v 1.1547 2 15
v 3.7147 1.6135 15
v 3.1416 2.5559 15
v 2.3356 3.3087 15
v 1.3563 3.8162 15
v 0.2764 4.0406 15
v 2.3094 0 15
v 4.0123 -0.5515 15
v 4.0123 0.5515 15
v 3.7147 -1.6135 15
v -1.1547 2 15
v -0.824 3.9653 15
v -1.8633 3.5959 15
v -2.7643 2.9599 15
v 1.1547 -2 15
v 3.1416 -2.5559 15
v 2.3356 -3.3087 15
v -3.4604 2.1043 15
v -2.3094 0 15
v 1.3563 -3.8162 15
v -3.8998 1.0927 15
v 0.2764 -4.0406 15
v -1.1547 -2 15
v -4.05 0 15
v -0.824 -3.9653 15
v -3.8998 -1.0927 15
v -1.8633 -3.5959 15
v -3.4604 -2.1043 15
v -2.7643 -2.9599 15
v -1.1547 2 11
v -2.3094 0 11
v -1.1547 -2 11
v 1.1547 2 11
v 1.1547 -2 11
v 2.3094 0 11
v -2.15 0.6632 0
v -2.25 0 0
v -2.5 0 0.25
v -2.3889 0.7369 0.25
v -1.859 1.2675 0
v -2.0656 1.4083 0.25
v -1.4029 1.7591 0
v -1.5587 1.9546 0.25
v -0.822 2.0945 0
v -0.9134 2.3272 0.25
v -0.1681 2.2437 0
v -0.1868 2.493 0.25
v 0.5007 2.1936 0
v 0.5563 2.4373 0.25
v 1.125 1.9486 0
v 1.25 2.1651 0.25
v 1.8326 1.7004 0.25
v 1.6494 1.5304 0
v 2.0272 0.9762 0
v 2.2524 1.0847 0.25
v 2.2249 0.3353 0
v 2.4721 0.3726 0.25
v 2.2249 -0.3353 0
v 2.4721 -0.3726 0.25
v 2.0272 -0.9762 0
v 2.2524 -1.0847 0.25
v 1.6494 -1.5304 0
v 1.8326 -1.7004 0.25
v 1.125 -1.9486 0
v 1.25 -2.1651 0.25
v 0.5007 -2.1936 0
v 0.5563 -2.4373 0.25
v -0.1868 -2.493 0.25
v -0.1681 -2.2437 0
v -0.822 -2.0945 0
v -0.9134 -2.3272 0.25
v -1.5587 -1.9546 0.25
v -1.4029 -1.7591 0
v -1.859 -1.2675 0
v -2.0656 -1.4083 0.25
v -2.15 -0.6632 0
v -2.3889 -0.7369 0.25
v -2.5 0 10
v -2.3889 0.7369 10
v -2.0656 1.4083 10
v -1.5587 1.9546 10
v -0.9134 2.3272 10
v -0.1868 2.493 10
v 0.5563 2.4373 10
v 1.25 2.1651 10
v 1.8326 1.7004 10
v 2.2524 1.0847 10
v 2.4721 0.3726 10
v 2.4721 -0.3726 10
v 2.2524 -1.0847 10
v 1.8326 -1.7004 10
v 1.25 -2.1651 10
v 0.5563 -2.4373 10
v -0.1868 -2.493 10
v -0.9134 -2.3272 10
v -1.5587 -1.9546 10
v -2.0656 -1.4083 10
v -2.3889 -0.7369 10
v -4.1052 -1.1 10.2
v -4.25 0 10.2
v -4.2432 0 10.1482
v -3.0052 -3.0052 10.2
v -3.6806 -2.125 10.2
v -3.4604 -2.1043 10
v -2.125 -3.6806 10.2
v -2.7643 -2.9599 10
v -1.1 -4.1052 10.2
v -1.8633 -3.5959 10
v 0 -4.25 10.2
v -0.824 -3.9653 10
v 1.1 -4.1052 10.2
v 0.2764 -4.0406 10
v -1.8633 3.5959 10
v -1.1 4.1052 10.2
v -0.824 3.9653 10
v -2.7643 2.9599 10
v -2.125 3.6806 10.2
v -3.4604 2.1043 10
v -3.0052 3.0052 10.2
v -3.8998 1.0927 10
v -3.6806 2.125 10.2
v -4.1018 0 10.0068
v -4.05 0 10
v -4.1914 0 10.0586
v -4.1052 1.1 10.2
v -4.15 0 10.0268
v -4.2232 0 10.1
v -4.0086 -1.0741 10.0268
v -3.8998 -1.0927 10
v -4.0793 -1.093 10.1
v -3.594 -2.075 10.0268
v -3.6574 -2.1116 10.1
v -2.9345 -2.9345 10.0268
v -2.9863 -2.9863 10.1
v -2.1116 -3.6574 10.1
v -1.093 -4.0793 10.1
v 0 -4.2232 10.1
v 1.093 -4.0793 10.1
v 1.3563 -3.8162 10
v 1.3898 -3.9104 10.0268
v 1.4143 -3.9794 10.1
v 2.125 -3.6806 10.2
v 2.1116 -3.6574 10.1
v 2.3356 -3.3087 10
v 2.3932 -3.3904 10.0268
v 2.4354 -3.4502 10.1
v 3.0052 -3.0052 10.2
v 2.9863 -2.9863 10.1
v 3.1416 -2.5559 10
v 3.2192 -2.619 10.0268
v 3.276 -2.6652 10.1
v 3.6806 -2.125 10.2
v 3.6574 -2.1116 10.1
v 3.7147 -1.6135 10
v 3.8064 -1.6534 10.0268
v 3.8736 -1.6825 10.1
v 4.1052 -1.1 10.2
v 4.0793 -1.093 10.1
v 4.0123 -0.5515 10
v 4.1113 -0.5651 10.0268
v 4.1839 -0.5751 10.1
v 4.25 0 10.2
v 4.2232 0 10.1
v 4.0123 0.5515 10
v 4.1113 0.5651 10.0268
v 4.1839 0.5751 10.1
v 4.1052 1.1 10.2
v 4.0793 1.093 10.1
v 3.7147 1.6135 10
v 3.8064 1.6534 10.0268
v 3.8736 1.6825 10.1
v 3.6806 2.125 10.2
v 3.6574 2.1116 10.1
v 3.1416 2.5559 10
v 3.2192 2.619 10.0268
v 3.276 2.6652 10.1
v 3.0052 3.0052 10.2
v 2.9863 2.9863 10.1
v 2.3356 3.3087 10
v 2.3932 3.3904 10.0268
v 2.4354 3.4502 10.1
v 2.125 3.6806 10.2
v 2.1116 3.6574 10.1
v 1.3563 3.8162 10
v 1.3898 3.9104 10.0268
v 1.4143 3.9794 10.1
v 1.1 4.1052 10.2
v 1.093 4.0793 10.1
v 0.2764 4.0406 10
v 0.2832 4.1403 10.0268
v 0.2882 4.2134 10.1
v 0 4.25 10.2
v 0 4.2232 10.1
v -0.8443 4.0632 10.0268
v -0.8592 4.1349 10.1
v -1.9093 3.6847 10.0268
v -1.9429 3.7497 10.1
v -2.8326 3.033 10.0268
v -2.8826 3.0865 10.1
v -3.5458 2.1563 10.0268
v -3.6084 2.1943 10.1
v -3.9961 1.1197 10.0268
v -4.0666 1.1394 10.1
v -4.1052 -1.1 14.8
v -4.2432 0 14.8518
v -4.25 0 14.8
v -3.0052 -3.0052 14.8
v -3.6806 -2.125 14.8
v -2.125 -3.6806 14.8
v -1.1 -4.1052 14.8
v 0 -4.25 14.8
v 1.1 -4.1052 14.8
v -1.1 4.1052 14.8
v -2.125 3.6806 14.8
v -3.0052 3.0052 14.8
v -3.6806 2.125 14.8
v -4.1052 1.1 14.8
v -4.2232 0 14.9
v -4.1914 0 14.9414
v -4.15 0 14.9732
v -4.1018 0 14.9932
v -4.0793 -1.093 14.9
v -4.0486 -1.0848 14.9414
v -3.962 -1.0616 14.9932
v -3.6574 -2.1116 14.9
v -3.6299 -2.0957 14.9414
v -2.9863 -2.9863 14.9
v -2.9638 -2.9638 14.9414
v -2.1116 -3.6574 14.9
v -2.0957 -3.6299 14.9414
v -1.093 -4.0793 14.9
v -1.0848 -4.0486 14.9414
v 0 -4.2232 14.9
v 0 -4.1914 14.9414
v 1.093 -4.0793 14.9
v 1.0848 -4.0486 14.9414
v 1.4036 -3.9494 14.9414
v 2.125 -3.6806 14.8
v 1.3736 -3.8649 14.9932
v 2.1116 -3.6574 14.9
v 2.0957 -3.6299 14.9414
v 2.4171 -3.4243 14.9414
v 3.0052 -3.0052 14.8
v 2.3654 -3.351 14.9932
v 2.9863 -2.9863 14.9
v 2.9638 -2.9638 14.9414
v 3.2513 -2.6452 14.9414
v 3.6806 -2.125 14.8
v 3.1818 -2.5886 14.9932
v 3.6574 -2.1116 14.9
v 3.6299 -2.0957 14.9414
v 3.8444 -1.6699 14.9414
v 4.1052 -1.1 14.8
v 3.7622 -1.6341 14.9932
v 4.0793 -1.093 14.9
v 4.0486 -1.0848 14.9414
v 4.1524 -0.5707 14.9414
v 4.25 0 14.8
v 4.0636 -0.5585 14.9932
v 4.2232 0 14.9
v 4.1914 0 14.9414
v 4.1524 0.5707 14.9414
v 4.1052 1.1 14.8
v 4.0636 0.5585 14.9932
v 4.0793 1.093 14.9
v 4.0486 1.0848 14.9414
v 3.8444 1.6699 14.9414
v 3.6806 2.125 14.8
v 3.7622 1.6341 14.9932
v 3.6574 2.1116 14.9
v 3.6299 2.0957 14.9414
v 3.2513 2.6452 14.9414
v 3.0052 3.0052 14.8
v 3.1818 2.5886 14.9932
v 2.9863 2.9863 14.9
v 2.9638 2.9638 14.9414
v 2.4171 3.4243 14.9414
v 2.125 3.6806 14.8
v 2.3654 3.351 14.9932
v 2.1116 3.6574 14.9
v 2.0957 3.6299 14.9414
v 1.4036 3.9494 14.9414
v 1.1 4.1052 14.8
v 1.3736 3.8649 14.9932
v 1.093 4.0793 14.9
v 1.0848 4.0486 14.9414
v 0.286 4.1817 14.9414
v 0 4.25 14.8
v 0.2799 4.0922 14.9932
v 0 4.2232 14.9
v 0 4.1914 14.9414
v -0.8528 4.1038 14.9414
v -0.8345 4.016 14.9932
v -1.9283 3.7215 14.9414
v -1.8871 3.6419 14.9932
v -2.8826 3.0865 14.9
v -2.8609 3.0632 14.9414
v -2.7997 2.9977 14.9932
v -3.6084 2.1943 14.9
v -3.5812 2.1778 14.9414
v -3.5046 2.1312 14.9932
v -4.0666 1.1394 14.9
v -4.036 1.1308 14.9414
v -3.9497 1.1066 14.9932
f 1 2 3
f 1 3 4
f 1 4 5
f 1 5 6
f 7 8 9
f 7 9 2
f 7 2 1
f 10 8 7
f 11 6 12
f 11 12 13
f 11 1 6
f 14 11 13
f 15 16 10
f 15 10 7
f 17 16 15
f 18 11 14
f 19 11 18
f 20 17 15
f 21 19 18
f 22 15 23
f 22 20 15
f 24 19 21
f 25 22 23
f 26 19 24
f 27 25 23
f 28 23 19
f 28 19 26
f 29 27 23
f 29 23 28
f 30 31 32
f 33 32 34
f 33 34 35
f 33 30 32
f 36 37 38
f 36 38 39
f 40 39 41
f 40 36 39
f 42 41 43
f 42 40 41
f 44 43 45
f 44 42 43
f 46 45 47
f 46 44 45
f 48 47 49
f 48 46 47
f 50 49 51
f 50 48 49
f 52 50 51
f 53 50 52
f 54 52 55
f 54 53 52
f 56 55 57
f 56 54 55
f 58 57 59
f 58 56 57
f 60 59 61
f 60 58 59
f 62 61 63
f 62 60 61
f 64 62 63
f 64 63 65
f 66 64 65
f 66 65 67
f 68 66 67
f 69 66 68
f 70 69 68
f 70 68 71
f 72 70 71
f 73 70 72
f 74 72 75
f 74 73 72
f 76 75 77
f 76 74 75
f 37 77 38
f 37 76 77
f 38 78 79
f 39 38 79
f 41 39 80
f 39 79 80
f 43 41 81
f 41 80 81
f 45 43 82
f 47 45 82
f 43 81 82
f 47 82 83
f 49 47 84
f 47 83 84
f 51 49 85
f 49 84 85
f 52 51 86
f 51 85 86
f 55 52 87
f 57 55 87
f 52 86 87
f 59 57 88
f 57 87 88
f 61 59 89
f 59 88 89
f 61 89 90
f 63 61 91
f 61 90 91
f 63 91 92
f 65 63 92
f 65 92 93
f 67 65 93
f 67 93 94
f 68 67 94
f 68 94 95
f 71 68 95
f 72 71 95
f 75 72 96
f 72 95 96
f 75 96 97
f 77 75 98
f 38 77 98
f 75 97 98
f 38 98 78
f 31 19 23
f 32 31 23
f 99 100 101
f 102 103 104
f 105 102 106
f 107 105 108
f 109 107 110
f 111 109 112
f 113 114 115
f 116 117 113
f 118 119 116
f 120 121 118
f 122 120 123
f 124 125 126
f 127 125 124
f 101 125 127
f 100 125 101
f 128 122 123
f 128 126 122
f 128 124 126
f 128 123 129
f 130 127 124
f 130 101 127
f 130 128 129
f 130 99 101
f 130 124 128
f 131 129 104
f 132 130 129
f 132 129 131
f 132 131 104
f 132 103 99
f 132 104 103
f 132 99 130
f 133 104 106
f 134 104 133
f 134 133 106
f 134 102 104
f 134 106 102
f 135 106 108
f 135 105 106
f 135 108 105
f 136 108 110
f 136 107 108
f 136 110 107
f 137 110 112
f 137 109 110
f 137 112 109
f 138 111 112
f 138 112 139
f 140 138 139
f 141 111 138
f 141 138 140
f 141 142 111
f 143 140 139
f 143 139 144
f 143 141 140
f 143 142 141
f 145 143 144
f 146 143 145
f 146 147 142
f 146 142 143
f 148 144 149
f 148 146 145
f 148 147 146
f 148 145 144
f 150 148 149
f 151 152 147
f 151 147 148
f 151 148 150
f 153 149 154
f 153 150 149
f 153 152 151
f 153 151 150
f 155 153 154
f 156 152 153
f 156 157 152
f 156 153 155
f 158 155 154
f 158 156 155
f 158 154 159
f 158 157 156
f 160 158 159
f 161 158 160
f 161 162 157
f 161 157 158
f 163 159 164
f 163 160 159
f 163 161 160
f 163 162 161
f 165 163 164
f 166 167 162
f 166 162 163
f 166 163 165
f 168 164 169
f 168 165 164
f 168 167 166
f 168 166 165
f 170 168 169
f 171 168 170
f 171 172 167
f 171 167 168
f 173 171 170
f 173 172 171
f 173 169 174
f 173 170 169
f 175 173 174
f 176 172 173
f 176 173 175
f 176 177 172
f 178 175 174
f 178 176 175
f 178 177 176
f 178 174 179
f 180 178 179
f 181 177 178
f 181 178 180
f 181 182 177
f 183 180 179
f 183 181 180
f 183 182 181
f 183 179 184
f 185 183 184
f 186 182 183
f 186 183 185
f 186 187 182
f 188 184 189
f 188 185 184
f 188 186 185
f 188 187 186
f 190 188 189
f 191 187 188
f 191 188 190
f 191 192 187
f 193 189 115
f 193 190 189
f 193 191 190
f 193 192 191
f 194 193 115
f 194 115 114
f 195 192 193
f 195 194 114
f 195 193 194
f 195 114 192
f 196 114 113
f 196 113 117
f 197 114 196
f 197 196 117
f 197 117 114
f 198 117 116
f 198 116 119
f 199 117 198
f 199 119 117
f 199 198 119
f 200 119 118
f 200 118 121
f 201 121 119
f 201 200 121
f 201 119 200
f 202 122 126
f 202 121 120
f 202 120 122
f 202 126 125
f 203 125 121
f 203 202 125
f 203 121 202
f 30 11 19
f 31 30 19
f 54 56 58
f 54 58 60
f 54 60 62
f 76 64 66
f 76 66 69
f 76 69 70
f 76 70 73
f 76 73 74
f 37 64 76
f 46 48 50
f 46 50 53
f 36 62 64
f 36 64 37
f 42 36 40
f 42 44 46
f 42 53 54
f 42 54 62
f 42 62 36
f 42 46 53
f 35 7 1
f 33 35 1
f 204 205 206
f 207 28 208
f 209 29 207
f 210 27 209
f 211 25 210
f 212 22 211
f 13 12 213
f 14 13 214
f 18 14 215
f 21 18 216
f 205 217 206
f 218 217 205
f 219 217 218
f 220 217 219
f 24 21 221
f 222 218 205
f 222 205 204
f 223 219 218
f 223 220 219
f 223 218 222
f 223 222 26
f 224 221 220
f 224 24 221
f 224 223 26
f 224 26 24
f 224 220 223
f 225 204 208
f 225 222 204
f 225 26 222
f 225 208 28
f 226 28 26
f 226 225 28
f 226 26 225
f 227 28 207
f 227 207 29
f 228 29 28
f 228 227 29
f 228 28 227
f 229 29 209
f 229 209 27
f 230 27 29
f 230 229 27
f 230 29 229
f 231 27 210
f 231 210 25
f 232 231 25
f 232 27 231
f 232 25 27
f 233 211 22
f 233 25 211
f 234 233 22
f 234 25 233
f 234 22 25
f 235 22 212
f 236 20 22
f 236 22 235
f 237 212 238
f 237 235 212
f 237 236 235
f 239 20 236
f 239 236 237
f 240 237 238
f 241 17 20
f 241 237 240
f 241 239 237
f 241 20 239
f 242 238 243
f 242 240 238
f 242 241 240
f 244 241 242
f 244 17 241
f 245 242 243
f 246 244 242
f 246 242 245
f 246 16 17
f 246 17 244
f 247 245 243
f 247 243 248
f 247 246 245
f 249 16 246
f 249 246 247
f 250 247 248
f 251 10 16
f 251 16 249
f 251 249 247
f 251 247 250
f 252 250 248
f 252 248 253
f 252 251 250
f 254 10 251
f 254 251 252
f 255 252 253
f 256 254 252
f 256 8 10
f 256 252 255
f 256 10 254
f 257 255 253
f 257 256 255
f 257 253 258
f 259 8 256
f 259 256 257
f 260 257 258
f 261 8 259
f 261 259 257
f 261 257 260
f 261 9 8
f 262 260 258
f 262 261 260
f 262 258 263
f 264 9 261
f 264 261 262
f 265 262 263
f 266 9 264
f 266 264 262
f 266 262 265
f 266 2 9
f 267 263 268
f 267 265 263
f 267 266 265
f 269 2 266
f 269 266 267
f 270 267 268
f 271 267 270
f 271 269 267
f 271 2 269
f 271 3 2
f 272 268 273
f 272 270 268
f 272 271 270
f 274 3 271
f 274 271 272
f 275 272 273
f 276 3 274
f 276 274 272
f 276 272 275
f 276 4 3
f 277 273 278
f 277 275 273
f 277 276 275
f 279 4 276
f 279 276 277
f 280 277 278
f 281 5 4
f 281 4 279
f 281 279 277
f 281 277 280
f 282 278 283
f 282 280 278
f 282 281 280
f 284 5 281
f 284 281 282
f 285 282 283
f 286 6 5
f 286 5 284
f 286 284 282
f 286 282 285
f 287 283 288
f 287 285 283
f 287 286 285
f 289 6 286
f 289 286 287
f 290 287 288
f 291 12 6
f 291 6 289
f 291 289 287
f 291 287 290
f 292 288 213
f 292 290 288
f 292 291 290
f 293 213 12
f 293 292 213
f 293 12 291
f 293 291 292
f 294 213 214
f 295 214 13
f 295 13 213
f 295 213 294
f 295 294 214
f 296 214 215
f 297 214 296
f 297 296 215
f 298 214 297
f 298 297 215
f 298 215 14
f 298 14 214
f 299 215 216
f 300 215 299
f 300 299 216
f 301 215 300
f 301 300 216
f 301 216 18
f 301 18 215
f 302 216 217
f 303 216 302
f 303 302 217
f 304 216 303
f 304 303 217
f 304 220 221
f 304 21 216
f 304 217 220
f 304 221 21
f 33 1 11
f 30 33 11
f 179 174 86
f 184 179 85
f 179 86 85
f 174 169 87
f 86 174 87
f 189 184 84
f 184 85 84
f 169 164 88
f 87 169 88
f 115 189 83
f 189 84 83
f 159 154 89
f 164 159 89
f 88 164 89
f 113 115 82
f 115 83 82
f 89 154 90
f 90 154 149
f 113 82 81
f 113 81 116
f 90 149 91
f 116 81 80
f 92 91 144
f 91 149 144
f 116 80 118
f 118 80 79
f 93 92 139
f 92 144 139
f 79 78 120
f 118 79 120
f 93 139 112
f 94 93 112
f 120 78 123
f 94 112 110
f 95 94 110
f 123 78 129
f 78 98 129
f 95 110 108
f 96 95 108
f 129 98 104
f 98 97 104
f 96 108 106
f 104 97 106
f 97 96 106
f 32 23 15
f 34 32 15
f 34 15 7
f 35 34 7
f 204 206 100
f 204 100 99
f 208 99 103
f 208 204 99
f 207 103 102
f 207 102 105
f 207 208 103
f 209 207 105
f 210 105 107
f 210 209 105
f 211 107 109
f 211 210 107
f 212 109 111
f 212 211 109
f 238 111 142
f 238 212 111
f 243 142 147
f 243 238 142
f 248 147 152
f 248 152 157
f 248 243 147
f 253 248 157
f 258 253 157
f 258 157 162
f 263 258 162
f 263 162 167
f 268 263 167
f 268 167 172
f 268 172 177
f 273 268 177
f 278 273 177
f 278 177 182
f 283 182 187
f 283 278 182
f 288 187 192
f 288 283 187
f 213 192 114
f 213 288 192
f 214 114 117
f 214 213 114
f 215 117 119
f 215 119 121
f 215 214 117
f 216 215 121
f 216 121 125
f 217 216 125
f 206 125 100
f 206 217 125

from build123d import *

# Parameters (mm, degrees)
SKETCH1_R           = 4.25
BOSS_EXTRUDE1_DEPTH = 5
SKETCH2_R           = 2.5
BOSS_EXTRUDE2_DEPTH = 10
CUT_EXTRUDE1_DEPTH  = 4
CHAMFER1_SIZE       = 0.25
FILLET1_R           = 0.2


with BuildPart() as part:
    # Sketch1 → Boss-Extrude1 (new body)
    with BuildSketch(Plane.XY.offset(15)):
        with Locations(Location((0, 0, 0), (0, 0, 180))):
            Circle(SKETCH1_R)
    extrude(amount=-BOSS_EXTRUDE1_DEPTH)

    # Sketch2 → Boss-Extrude2 (add)
    with BuildSketch(Plane(origin=(0, 0, 10), x_dir=(-1, 0, 0), z_dir=(0, 0, -1))):
        Circle(SKETCH2_R)
    extrude(amount=BOSS_EXTRUDE2_DEPTH)

    # Sketch3 → Cut-Extrude1 (cut)
    with BuildSketch(Plane.XY.offset(15)):
        Polygon((-2.309401077, 0), (-1.154700538, -2), (1.154700538, -2), (2.309401077, 0), (1.154700538, 2), (-1.154700538, 2), align=None)
    extrude(amount=-CUT_EXTRUDE1_DEPTH, mode=Mode.SUBTRACT)

    # Chamfer1
    chamfer1_edges = [part.edges().sort_by_distance(p)[0] for p in [
        (2.5, 0, 0),
    ]]
    chamfer(chamfer1_edges, length=CHAMFER1_SIZE)

    # Fillet1
    fillet1_edges = [part.edges().sort_by_distance(p)[0] for p in [
        (4.25, 0, 15),
        (4.25, 0, 10),
    ]]
    fillet(fillet1_edges, radius=FILLET1_R)


solid = part.part
